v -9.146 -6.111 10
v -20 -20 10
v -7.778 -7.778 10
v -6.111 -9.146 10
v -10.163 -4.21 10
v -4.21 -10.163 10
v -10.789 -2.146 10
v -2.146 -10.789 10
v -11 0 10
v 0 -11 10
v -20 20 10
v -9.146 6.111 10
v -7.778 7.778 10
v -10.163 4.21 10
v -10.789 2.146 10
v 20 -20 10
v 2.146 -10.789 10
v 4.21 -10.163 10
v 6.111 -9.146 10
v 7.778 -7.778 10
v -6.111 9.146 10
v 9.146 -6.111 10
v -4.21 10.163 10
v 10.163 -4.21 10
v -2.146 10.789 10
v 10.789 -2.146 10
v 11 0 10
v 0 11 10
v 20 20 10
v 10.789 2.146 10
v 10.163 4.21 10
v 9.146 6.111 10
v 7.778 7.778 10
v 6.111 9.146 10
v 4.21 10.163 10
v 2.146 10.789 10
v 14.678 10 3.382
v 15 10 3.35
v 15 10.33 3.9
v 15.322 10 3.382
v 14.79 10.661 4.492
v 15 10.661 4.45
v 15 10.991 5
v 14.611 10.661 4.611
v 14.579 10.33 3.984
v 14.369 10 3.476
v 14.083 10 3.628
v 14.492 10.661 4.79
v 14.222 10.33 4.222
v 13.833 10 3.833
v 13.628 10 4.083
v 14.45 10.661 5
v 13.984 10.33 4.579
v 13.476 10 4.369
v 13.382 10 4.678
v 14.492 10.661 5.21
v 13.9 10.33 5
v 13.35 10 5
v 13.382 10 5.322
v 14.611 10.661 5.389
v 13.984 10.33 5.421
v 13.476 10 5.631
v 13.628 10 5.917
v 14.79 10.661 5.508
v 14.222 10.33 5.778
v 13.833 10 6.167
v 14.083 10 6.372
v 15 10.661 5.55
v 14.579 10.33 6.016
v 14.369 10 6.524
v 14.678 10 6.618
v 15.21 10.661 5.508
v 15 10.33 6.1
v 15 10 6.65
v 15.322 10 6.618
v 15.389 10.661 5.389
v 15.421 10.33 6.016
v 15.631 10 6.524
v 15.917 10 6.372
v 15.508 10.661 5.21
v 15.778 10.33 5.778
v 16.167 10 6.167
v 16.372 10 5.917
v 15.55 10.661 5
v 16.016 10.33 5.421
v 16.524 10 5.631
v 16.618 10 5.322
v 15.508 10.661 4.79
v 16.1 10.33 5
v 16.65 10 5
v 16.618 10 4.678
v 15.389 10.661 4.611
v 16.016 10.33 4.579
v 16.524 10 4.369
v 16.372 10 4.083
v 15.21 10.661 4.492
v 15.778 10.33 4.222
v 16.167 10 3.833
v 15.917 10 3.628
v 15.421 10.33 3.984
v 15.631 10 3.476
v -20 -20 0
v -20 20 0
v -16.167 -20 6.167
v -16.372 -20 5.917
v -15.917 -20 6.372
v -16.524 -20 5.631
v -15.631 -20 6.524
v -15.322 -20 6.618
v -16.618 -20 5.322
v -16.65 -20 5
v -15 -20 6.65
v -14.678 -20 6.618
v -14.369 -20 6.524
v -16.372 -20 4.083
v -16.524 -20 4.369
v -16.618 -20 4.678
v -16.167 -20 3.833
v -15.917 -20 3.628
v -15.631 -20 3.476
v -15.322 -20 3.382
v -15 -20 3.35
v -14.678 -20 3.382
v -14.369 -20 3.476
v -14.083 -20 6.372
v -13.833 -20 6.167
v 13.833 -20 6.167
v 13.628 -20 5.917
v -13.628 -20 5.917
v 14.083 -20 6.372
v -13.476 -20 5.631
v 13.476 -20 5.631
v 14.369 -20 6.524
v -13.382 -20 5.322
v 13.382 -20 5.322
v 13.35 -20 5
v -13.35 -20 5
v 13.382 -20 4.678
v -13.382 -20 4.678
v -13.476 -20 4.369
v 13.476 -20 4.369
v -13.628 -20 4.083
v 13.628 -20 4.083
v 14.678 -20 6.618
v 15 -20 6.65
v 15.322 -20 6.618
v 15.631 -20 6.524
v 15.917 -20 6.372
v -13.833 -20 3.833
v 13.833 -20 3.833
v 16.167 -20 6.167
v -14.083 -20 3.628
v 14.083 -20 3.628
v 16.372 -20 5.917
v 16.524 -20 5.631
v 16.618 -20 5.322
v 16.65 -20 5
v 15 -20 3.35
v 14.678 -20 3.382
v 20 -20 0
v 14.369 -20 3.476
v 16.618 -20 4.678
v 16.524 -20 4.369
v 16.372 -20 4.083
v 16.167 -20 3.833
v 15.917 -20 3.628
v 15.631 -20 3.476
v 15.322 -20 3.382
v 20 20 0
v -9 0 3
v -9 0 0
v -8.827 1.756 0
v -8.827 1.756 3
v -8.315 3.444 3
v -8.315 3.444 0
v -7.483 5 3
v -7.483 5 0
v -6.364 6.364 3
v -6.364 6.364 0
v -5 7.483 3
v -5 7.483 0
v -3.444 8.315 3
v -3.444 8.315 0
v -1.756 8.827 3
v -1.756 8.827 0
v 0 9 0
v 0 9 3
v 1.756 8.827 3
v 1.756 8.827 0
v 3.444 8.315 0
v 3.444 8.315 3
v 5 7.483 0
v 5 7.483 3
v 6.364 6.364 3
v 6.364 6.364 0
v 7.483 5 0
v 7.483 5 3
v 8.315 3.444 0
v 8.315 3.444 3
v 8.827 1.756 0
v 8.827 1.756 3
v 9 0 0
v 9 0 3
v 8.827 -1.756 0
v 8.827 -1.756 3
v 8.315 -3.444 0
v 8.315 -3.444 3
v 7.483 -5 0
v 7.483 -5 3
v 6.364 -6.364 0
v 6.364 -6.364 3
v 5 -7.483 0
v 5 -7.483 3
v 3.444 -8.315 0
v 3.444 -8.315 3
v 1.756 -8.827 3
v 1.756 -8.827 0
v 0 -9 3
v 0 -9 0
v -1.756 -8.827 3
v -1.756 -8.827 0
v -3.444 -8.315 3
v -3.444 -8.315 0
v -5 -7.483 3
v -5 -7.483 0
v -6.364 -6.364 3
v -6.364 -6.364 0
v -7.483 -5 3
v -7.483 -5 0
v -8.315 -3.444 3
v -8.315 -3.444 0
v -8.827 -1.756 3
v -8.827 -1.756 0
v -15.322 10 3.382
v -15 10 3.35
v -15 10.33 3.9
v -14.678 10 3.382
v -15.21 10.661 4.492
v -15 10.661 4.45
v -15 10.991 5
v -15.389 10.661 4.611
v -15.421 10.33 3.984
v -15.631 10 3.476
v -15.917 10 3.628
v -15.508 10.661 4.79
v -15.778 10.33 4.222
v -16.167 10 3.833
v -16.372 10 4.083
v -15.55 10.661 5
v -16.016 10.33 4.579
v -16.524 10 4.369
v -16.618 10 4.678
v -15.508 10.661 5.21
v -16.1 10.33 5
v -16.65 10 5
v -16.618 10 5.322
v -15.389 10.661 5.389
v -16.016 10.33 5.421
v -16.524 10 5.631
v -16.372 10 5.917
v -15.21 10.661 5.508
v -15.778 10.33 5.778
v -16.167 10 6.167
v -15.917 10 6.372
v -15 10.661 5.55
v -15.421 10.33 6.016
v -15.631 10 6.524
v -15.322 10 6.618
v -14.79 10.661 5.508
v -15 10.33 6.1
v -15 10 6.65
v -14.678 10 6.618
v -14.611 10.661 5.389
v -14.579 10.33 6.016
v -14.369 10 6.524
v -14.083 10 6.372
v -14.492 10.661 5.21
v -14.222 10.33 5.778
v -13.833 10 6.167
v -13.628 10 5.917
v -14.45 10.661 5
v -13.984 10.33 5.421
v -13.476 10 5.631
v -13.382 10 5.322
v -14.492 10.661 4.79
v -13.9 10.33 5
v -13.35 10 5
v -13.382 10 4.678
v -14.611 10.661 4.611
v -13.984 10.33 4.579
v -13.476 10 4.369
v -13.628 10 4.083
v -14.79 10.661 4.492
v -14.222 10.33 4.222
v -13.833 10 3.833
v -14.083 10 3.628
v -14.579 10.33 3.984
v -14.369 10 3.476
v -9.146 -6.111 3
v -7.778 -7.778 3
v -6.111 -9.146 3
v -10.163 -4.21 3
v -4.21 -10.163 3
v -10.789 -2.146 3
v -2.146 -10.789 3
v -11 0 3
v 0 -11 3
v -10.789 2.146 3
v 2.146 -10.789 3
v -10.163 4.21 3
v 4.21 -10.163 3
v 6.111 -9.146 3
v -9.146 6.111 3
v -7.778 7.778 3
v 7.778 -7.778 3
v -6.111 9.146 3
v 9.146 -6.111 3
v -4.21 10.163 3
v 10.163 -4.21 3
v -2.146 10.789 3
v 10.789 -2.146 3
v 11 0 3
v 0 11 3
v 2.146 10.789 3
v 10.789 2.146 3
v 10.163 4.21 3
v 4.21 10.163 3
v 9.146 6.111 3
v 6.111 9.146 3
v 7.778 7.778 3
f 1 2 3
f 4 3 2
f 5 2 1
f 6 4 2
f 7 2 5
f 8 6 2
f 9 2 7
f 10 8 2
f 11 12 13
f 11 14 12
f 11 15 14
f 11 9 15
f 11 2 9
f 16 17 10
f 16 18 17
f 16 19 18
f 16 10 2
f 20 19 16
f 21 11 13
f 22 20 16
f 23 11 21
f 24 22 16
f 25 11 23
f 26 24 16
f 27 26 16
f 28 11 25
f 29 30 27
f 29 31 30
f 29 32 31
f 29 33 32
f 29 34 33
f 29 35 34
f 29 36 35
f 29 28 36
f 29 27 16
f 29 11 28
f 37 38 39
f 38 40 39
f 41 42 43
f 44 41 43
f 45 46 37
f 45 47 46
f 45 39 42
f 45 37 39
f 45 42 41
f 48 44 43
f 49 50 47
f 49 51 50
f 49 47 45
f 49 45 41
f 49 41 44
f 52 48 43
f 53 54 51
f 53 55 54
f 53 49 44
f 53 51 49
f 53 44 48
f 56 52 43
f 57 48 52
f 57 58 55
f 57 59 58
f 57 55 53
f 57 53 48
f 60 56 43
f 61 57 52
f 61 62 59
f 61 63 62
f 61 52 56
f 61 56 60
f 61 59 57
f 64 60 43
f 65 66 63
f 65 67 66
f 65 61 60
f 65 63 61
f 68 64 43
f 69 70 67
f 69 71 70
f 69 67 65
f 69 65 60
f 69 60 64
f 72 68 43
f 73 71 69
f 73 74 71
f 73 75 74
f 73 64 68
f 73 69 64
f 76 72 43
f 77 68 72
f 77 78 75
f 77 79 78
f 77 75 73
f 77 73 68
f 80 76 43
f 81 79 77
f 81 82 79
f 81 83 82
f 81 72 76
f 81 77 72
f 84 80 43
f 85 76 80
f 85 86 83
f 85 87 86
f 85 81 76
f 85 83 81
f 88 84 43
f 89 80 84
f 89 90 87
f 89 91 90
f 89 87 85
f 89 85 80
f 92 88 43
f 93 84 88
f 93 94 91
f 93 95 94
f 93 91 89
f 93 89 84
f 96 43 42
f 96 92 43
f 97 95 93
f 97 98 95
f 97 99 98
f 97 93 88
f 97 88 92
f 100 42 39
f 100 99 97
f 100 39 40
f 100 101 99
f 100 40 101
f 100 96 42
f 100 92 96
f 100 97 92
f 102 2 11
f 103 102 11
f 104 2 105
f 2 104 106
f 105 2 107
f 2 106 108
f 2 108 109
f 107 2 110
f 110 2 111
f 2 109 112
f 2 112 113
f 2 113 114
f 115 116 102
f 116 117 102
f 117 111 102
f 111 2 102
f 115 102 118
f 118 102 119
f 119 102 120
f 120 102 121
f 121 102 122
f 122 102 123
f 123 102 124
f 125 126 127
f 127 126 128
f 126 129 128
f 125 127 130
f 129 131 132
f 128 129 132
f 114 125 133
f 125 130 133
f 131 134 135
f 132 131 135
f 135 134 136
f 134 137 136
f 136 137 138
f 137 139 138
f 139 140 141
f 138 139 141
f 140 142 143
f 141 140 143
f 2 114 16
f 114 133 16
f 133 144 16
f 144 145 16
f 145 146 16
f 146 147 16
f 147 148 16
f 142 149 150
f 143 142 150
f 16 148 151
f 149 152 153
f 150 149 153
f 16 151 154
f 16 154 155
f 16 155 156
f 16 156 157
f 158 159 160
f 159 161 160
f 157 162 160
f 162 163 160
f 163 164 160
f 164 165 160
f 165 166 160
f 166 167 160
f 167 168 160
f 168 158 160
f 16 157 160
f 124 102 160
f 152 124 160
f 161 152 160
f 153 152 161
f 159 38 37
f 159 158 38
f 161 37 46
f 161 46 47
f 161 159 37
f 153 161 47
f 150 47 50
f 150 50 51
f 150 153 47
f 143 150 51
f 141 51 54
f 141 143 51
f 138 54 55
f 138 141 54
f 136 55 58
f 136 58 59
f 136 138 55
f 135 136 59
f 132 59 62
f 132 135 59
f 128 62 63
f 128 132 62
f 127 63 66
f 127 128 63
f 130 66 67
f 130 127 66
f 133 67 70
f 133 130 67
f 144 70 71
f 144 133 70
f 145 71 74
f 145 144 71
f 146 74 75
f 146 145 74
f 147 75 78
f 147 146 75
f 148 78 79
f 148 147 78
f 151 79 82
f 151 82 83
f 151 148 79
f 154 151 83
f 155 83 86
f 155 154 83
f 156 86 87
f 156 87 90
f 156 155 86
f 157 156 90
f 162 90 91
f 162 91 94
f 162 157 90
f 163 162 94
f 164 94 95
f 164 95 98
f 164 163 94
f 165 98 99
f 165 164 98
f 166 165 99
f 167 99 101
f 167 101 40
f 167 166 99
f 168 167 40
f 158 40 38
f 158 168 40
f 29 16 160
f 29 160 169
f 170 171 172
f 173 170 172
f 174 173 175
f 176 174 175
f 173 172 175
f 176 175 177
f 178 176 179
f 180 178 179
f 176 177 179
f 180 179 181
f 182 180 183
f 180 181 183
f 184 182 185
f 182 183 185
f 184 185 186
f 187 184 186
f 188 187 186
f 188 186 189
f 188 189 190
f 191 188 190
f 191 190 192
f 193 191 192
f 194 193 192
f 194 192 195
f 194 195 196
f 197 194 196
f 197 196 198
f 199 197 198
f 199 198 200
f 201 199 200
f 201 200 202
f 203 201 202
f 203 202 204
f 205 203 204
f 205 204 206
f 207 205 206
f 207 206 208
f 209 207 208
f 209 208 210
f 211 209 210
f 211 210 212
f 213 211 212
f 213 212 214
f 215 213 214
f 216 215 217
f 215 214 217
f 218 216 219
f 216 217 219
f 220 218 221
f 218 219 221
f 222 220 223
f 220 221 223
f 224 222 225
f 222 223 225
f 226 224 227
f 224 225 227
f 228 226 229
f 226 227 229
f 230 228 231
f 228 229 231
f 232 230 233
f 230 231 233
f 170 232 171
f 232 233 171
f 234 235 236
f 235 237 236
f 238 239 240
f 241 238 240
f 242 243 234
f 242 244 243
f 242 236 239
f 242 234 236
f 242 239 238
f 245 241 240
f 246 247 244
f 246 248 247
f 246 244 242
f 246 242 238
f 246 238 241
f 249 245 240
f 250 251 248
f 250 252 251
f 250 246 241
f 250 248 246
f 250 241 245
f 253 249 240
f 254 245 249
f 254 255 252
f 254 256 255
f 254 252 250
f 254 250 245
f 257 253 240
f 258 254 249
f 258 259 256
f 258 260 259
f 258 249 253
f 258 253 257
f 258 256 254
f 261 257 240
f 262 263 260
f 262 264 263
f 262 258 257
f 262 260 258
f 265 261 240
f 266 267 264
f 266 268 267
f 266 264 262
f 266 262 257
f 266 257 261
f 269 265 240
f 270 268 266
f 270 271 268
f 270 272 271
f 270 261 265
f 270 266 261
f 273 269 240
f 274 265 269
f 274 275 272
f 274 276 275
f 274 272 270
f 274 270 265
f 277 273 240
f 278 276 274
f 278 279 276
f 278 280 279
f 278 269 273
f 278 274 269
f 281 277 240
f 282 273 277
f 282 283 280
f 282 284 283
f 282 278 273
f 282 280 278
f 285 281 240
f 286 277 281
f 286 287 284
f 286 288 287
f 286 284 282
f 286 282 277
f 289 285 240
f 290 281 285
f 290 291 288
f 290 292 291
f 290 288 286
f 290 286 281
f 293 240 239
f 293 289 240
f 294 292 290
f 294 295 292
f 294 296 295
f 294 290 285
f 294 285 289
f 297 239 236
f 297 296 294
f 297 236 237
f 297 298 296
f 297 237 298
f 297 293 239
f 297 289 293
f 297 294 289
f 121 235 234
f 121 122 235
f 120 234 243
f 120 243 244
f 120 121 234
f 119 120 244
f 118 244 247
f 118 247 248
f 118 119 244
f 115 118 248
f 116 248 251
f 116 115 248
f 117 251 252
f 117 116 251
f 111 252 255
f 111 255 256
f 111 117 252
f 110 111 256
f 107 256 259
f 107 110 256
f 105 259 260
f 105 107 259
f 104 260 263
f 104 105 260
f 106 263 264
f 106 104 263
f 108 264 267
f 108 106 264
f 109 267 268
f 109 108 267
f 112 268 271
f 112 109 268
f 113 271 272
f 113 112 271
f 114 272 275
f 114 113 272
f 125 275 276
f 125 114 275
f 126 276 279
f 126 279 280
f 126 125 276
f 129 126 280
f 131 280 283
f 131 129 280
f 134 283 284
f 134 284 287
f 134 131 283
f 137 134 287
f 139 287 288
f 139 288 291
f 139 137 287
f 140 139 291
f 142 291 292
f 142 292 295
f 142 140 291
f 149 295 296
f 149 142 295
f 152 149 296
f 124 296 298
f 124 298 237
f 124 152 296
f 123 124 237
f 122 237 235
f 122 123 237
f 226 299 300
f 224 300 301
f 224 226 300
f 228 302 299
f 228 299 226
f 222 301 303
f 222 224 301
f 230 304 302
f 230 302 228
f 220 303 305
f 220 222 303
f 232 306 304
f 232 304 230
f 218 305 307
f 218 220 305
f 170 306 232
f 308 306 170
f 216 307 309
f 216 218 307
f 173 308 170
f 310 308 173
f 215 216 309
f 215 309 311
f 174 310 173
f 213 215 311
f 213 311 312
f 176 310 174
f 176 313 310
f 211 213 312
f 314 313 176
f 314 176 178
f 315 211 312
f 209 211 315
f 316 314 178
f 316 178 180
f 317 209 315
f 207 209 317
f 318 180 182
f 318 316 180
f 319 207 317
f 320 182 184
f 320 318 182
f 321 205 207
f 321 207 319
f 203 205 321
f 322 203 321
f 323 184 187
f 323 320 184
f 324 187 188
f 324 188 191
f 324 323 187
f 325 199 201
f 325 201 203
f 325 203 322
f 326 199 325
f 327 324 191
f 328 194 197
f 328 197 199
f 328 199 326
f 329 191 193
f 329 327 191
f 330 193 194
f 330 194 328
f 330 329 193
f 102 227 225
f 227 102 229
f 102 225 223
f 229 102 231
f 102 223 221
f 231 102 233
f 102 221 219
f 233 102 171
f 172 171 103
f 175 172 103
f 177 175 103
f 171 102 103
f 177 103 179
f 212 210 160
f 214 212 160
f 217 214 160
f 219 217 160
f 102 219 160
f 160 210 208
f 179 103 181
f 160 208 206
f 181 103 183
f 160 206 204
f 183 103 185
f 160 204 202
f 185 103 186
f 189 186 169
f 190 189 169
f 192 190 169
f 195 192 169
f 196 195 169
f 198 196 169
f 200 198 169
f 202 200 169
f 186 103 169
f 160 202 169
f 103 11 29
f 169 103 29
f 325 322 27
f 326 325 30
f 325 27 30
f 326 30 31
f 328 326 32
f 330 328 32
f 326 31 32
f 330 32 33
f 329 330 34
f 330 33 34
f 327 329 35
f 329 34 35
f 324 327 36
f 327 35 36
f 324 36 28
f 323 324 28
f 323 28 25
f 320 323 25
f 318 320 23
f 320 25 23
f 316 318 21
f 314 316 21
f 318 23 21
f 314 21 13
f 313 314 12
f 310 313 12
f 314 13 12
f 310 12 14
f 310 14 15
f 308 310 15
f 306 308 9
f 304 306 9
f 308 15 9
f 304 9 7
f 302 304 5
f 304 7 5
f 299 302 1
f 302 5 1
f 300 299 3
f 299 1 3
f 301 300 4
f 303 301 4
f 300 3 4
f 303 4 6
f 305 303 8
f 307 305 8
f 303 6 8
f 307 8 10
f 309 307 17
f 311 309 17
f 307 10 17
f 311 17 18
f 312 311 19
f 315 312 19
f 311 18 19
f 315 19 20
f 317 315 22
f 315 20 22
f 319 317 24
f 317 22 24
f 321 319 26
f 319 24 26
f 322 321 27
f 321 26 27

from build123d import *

# Parameters (mm, degrees)
BASE_EXTRUSION_DEPTH       = 10
ESQUISSE2_R                = 11
ENL_V_MAT_EXTRU_1_DEPTH    = 7
ESQUISSE3_R                = 9
ENL_V_MAT_EXTRU_2_DEPTH    = 44.588989435
ESQUISSE4_OUTSIDE_W        = 77.748
ESQUISSE4_OUTSIDE_H        = 67.748
ESQUISSE4_OUTSIDE_W_2      = 40
ESQUISSE4_OUTSIDE_H_2      = 40
ENL_V_MAT_EXTRU_3_DEPTH    = 44.588989435
R_P_TITION_LIN_AIRE1_COUNT = 2
R_P_TITION_LIN_AIRE1_PITCH = 30


with BuildPart() as part:
    # Esquisse1 → Base-Extrusion (new body)
    with BuildSketch(Plane.XY):
        with BuildLine():
            Line((-22.360679775, -20), (22.360679775, -20))
            ThreePointArc((22.360679775, -20), (0, 30), (-22.360679775, -20))
        make_face()
    extrude(amount=BASE_EXTRUSION_DEPTH)

    # Esquisse2 → Enlèv. mat.-Extru.1 (cut)
    with BuildSketch(Plane.XY.offset(10)):
        Circle(ESQUISSE2_R)
    extrude(amount=-ENL_V_MAT_EXTRU_1_DEPTH, mode=Mode.SUBTRACT)

    # Esquisse3 → Enlèv. mat.-Extru.2 (cut, through all)
    with BuildSketch(Plane(origin=(0, 0, 0), x_dir=(-1, 0, 0), z_dir=(0, 0, -1))):
        Circle(ESQUISSE3_R)
    extrude(amount=-ENL_V_MAT_EXTRU_2_DEPTH, mode=Mode.SUBTRACT)

    # Esquisse4 outside → Enlèv. mat.-Extru.3 (cut, through all)
    with BuildSketch(Plane.XY.offset(10)):
        with Locations((0, 5)):
            Rectangle(ESQUISSE4_OUTSIDE_W, ESQUISSE4_OUTSIDE_H)
        Rectangle(ESQUISSE4_OUTSIDE_W_2, ESQUISSE4_OUTSIDE_H_2, mode=Mode.SUBTRACT)
    extrude(amount=-ENL_V_MAT_EXTRU_3_DEPTH, mode=Mode.SUBTRACT)

    # Esquisse5 → Perçage1 (revolve, cut)
    with BuildSketch(Plane(origin=(15, -20, 5), x_dir=(0, 0, -1), z_dir=(1, 0, 0))):
        Polygon((0, 0), (0, 30.991420021), (1.65, 30), (1.65, 0), align=None)
    per_age1 = revolve(axis=Axis((15, -26.35, 5), (0, 1, 0)), mode=Mode.SUBTRACT)

    # Répétition linéaire1: Perçage1 ×2
    with Locations(*[(-i * R_P_TITION_LIN_AIRE1_PITCH, 0, 0) for i in range(1, R_P_TITION_LIN_AIRE1_COUNT)]):
        add(per_age1, mode=Mode.SUBTRACT)


solid = part.part
